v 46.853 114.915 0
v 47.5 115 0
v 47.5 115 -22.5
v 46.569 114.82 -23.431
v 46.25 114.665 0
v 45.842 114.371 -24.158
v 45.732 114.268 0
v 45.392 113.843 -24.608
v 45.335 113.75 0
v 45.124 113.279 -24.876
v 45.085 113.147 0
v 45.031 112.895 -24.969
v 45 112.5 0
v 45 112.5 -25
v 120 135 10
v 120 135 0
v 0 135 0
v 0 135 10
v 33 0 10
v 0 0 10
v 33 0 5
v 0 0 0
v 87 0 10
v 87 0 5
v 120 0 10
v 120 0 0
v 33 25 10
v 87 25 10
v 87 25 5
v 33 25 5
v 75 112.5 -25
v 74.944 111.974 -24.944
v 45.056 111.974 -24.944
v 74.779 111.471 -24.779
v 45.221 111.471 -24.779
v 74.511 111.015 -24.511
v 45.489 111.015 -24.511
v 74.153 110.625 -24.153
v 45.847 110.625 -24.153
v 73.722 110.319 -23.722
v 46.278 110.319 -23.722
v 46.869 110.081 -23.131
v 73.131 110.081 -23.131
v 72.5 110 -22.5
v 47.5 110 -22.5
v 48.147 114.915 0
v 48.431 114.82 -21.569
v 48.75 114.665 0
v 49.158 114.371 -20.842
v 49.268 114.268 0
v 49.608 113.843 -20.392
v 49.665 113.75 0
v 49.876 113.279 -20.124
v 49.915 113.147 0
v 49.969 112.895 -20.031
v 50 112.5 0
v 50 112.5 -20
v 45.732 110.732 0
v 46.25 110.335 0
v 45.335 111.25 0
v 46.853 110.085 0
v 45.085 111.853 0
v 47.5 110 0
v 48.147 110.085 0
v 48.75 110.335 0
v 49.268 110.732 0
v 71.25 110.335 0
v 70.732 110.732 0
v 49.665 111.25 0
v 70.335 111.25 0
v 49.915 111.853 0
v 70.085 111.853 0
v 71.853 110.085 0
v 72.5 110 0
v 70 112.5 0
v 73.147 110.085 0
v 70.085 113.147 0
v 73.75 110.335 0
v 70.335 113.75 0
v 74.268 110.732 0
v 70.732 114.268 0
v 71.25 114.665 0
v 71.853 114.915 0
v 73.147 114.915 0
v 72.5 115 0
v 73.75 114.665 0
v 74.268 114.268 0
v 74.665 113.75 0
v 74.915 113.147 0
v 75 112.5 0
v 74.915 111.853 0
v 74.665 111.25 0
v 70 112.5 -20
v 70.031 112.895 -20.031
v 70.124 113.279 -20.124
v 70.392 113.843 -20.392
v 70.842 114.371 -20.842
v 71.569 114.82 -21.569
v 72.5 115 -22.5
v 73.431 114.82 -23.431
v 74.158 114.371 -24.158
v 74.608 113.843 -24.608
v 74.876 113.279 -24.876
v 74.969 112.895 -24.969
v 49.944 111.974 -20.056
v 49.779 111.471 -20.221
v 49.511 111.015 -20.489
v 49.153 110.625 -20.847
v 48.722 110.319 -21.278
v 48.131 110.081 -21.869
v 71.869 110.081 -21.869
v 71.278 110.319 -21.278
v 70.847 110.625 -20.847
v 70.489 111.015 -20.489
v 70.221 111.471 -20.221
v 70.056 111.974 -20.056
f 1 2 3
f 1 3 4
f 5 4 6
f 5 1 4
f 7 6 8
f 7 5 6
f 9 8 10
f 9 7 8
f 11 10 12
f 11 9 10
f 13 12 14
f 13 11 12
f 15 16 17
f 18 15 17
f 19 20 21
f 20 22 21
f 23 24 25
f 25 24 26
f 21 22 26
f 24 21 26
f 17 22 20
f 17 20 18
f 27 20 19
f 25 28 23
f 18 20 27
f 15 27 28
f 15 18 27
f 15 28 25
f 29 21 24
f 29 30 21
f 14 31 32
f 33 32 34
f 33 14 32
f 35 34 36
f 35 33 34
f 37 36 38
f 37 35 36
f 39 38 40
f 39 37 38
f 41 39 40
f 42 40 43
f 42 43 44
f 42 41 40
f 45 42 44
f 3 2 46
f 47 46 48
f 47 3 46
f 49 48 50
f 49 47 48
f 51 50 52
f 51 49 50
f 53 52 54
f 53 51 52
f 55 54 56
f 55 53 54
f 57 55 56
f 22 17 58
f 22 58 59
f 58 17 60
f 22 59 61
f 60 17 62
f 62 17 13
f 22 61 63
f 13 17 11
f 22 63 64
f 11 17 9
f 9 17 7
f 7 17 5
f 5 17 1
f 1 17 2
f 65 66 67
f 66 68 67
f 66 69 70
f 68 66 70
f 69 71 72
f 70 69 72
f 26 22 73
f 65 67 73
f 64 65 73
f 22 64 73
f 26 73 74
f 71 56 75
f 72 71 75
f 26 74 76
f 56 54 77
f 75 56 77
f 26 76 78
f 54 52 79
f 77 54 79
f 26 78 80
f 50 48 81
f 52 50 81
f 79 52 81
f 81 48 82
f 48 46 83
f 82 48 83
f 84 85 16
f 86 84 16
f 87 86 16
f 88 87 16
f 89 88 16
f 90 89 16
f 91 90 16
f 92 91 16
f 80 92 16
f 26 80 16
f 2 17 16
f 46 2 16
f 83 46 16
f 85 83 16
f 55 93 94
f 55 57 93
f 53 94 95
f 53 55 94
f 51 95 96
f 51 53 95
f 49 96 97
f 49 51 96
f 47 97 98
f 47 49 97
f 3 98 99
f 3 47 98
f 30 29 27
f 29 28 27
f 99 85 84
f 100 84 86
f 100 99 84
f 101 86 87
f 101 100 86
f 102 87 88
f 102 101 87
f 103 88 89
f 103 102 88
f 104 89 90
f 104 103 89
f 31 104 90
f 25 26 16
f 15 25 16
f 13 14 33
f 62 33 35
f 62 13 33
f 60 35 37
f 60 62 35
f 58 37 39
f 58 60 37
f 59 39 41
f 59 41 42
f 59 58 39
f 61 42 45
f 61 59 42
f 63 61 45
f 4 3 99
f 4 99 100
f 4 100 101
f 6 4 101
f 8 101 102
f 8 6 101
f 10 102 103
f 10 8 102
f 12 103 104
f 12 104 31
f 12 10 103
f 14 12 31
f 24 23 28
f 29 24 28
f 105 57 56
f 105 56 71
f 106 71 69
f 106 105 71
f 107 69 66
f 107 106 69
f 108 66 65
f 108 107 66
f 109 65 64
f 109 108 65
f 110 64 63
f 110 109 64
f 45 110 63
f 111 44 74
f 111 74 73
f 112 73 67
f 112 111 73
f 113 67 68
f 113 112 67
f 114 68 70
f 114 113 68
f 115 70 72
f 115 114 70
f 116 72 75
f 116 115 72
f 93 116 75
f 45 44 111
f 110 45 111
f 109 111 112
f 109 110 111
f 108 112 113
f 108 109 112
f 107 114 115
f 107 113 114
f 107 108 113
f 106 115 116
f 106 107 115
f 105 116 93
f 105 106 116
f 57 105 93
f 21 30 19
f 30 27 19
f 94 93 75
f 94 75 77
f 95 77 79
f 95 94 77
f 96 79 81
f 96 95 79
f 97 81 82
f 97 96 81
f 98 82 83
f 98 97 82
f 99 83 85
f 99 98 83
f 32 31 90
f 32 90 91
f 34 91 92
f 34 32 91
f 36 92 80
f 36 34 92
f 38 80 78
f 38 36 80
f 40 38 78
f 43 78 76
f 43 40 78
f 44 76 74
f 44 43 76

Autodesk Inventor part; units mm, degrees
ref_plane "YZ Plane" through (0, 0, 0) normal (1, 0, 0) x (0, 1, 0)
ref_plane "XZ Plane" through (0, 0, 0) normal (0, 1, 0) x (-1, 0, 0)
ref_plane "XY Plane" through (0, 0, 0) normal (0, 0, 1) x (1, 0, 0)
sketch "Skizze1" plane through (0, 0, 0) normal (0, 0, 1) x (1, 0, 0)
  line L0 (-24, 0) -> (144, 0) projected
  line L1 (0, -27) -> (0, 162) projected
  line L2 (0, 0) -> (120, 0)
  line L3 (120, 0) -> (120, 135)
  line L4 (120, 135) -> (0, 135)
  line L5 (0, 135) -> (0, 0)
  point P0 (0, 135)
  dimension "d0" = 135
  dimension "d1" = 120
extrude "Extrusion1" add sketch "Skizze1" along normal blind 10
sketch "Skizze2" plane through (0, 0, 10) normal (0, 0, 1) x (1, 0, 0)
  line L0 (0, 0) -> (120, 0) projected
  line L1 (33, 0) -> (87, 0)
  line L2 (87, 0) -> (87, 25)
  line L3 (87, 25) -> (33, 25)
  line L4 (33, 25) -> (33, 0)
  line L5 (0, 135) -> (0, 0) projected
  dimension "d4" = 54
  dimension "d5" = 25
  dimension "d6" = 33
extrude "Extrusion2" cut sketch "Skizze2" against normal blind 5
sketch "Skizze3" plane through (0, 0, 0) normal (0, 0, -1) x (-1, 0, 0)
  line L0 (-75, 115) -> (-70, 115)
  line L1 (-70, 115) -> (-70, 110)
  line L2 (-70, 110) -> (-75, 110)
  line L3 (-75, 110) -> (-75, 115)
  line L4 (-50, 115) -> (-45, 115)
  line L5 (-45, 115) -> (-45, 110)
  line L6 (-45, 110) -> (-50, 110)
  line L7 (-50, 110) -> (-50, 115)
  line L8 (-120, 135) -> (0, 135)
  line L9 (-120, 0) -> (-120, 135) projected
  line L10 (0, 135) -> (0, 0) projected
  line L11 (-120, 135) -> (0, 135) projected
  dimension "d9" = 5
  dimension "d10" = 5
  dimension "d11" = 5
  dimension "d12" = 5
  dimension "d13" = 20
  dimension "d14" = 20
  dimension "d15" = 45
  dimension "d16" = 45
  dimension "d17" = 20
extrude "Extrusion3" add sketch "Skizze3" along normal blind 20
sketch "Skizze4" plane through (75, 110, 0) normal (1, 0, 0) x (0, 0, -1)
  line L0 (0, 5) -> (20, 5) projected
  line L1 (20, 5) -> (25, 5)
  line L2 (25, 5) -> (25, 0)
  line L3 (25, 0) -> (20, 0)
  line L4 (20, 0) -> (20, 5)
  point P0 (0, -110)
  dimension "d20" = 5
  dimension "d21" = 5
extrude "Extrusion4" add sketch "Skizze4" against normal blind 30
fillet "Rundung1" radius 2.5 12 edges at (60, 110, -25) (60, 115, -25) (75, 115, -12.5) (75, 110, -12.5) (45, 110, -12.5) (50, 110, -10) (70, 110, -10) (60, 110, -20) (50, 115, -10) (60, 115, -20) (70, 115, -10) (45, 115, -12.5)
properties part number "DeckelMess_Better" material "Acetalharz, Schwarz"
